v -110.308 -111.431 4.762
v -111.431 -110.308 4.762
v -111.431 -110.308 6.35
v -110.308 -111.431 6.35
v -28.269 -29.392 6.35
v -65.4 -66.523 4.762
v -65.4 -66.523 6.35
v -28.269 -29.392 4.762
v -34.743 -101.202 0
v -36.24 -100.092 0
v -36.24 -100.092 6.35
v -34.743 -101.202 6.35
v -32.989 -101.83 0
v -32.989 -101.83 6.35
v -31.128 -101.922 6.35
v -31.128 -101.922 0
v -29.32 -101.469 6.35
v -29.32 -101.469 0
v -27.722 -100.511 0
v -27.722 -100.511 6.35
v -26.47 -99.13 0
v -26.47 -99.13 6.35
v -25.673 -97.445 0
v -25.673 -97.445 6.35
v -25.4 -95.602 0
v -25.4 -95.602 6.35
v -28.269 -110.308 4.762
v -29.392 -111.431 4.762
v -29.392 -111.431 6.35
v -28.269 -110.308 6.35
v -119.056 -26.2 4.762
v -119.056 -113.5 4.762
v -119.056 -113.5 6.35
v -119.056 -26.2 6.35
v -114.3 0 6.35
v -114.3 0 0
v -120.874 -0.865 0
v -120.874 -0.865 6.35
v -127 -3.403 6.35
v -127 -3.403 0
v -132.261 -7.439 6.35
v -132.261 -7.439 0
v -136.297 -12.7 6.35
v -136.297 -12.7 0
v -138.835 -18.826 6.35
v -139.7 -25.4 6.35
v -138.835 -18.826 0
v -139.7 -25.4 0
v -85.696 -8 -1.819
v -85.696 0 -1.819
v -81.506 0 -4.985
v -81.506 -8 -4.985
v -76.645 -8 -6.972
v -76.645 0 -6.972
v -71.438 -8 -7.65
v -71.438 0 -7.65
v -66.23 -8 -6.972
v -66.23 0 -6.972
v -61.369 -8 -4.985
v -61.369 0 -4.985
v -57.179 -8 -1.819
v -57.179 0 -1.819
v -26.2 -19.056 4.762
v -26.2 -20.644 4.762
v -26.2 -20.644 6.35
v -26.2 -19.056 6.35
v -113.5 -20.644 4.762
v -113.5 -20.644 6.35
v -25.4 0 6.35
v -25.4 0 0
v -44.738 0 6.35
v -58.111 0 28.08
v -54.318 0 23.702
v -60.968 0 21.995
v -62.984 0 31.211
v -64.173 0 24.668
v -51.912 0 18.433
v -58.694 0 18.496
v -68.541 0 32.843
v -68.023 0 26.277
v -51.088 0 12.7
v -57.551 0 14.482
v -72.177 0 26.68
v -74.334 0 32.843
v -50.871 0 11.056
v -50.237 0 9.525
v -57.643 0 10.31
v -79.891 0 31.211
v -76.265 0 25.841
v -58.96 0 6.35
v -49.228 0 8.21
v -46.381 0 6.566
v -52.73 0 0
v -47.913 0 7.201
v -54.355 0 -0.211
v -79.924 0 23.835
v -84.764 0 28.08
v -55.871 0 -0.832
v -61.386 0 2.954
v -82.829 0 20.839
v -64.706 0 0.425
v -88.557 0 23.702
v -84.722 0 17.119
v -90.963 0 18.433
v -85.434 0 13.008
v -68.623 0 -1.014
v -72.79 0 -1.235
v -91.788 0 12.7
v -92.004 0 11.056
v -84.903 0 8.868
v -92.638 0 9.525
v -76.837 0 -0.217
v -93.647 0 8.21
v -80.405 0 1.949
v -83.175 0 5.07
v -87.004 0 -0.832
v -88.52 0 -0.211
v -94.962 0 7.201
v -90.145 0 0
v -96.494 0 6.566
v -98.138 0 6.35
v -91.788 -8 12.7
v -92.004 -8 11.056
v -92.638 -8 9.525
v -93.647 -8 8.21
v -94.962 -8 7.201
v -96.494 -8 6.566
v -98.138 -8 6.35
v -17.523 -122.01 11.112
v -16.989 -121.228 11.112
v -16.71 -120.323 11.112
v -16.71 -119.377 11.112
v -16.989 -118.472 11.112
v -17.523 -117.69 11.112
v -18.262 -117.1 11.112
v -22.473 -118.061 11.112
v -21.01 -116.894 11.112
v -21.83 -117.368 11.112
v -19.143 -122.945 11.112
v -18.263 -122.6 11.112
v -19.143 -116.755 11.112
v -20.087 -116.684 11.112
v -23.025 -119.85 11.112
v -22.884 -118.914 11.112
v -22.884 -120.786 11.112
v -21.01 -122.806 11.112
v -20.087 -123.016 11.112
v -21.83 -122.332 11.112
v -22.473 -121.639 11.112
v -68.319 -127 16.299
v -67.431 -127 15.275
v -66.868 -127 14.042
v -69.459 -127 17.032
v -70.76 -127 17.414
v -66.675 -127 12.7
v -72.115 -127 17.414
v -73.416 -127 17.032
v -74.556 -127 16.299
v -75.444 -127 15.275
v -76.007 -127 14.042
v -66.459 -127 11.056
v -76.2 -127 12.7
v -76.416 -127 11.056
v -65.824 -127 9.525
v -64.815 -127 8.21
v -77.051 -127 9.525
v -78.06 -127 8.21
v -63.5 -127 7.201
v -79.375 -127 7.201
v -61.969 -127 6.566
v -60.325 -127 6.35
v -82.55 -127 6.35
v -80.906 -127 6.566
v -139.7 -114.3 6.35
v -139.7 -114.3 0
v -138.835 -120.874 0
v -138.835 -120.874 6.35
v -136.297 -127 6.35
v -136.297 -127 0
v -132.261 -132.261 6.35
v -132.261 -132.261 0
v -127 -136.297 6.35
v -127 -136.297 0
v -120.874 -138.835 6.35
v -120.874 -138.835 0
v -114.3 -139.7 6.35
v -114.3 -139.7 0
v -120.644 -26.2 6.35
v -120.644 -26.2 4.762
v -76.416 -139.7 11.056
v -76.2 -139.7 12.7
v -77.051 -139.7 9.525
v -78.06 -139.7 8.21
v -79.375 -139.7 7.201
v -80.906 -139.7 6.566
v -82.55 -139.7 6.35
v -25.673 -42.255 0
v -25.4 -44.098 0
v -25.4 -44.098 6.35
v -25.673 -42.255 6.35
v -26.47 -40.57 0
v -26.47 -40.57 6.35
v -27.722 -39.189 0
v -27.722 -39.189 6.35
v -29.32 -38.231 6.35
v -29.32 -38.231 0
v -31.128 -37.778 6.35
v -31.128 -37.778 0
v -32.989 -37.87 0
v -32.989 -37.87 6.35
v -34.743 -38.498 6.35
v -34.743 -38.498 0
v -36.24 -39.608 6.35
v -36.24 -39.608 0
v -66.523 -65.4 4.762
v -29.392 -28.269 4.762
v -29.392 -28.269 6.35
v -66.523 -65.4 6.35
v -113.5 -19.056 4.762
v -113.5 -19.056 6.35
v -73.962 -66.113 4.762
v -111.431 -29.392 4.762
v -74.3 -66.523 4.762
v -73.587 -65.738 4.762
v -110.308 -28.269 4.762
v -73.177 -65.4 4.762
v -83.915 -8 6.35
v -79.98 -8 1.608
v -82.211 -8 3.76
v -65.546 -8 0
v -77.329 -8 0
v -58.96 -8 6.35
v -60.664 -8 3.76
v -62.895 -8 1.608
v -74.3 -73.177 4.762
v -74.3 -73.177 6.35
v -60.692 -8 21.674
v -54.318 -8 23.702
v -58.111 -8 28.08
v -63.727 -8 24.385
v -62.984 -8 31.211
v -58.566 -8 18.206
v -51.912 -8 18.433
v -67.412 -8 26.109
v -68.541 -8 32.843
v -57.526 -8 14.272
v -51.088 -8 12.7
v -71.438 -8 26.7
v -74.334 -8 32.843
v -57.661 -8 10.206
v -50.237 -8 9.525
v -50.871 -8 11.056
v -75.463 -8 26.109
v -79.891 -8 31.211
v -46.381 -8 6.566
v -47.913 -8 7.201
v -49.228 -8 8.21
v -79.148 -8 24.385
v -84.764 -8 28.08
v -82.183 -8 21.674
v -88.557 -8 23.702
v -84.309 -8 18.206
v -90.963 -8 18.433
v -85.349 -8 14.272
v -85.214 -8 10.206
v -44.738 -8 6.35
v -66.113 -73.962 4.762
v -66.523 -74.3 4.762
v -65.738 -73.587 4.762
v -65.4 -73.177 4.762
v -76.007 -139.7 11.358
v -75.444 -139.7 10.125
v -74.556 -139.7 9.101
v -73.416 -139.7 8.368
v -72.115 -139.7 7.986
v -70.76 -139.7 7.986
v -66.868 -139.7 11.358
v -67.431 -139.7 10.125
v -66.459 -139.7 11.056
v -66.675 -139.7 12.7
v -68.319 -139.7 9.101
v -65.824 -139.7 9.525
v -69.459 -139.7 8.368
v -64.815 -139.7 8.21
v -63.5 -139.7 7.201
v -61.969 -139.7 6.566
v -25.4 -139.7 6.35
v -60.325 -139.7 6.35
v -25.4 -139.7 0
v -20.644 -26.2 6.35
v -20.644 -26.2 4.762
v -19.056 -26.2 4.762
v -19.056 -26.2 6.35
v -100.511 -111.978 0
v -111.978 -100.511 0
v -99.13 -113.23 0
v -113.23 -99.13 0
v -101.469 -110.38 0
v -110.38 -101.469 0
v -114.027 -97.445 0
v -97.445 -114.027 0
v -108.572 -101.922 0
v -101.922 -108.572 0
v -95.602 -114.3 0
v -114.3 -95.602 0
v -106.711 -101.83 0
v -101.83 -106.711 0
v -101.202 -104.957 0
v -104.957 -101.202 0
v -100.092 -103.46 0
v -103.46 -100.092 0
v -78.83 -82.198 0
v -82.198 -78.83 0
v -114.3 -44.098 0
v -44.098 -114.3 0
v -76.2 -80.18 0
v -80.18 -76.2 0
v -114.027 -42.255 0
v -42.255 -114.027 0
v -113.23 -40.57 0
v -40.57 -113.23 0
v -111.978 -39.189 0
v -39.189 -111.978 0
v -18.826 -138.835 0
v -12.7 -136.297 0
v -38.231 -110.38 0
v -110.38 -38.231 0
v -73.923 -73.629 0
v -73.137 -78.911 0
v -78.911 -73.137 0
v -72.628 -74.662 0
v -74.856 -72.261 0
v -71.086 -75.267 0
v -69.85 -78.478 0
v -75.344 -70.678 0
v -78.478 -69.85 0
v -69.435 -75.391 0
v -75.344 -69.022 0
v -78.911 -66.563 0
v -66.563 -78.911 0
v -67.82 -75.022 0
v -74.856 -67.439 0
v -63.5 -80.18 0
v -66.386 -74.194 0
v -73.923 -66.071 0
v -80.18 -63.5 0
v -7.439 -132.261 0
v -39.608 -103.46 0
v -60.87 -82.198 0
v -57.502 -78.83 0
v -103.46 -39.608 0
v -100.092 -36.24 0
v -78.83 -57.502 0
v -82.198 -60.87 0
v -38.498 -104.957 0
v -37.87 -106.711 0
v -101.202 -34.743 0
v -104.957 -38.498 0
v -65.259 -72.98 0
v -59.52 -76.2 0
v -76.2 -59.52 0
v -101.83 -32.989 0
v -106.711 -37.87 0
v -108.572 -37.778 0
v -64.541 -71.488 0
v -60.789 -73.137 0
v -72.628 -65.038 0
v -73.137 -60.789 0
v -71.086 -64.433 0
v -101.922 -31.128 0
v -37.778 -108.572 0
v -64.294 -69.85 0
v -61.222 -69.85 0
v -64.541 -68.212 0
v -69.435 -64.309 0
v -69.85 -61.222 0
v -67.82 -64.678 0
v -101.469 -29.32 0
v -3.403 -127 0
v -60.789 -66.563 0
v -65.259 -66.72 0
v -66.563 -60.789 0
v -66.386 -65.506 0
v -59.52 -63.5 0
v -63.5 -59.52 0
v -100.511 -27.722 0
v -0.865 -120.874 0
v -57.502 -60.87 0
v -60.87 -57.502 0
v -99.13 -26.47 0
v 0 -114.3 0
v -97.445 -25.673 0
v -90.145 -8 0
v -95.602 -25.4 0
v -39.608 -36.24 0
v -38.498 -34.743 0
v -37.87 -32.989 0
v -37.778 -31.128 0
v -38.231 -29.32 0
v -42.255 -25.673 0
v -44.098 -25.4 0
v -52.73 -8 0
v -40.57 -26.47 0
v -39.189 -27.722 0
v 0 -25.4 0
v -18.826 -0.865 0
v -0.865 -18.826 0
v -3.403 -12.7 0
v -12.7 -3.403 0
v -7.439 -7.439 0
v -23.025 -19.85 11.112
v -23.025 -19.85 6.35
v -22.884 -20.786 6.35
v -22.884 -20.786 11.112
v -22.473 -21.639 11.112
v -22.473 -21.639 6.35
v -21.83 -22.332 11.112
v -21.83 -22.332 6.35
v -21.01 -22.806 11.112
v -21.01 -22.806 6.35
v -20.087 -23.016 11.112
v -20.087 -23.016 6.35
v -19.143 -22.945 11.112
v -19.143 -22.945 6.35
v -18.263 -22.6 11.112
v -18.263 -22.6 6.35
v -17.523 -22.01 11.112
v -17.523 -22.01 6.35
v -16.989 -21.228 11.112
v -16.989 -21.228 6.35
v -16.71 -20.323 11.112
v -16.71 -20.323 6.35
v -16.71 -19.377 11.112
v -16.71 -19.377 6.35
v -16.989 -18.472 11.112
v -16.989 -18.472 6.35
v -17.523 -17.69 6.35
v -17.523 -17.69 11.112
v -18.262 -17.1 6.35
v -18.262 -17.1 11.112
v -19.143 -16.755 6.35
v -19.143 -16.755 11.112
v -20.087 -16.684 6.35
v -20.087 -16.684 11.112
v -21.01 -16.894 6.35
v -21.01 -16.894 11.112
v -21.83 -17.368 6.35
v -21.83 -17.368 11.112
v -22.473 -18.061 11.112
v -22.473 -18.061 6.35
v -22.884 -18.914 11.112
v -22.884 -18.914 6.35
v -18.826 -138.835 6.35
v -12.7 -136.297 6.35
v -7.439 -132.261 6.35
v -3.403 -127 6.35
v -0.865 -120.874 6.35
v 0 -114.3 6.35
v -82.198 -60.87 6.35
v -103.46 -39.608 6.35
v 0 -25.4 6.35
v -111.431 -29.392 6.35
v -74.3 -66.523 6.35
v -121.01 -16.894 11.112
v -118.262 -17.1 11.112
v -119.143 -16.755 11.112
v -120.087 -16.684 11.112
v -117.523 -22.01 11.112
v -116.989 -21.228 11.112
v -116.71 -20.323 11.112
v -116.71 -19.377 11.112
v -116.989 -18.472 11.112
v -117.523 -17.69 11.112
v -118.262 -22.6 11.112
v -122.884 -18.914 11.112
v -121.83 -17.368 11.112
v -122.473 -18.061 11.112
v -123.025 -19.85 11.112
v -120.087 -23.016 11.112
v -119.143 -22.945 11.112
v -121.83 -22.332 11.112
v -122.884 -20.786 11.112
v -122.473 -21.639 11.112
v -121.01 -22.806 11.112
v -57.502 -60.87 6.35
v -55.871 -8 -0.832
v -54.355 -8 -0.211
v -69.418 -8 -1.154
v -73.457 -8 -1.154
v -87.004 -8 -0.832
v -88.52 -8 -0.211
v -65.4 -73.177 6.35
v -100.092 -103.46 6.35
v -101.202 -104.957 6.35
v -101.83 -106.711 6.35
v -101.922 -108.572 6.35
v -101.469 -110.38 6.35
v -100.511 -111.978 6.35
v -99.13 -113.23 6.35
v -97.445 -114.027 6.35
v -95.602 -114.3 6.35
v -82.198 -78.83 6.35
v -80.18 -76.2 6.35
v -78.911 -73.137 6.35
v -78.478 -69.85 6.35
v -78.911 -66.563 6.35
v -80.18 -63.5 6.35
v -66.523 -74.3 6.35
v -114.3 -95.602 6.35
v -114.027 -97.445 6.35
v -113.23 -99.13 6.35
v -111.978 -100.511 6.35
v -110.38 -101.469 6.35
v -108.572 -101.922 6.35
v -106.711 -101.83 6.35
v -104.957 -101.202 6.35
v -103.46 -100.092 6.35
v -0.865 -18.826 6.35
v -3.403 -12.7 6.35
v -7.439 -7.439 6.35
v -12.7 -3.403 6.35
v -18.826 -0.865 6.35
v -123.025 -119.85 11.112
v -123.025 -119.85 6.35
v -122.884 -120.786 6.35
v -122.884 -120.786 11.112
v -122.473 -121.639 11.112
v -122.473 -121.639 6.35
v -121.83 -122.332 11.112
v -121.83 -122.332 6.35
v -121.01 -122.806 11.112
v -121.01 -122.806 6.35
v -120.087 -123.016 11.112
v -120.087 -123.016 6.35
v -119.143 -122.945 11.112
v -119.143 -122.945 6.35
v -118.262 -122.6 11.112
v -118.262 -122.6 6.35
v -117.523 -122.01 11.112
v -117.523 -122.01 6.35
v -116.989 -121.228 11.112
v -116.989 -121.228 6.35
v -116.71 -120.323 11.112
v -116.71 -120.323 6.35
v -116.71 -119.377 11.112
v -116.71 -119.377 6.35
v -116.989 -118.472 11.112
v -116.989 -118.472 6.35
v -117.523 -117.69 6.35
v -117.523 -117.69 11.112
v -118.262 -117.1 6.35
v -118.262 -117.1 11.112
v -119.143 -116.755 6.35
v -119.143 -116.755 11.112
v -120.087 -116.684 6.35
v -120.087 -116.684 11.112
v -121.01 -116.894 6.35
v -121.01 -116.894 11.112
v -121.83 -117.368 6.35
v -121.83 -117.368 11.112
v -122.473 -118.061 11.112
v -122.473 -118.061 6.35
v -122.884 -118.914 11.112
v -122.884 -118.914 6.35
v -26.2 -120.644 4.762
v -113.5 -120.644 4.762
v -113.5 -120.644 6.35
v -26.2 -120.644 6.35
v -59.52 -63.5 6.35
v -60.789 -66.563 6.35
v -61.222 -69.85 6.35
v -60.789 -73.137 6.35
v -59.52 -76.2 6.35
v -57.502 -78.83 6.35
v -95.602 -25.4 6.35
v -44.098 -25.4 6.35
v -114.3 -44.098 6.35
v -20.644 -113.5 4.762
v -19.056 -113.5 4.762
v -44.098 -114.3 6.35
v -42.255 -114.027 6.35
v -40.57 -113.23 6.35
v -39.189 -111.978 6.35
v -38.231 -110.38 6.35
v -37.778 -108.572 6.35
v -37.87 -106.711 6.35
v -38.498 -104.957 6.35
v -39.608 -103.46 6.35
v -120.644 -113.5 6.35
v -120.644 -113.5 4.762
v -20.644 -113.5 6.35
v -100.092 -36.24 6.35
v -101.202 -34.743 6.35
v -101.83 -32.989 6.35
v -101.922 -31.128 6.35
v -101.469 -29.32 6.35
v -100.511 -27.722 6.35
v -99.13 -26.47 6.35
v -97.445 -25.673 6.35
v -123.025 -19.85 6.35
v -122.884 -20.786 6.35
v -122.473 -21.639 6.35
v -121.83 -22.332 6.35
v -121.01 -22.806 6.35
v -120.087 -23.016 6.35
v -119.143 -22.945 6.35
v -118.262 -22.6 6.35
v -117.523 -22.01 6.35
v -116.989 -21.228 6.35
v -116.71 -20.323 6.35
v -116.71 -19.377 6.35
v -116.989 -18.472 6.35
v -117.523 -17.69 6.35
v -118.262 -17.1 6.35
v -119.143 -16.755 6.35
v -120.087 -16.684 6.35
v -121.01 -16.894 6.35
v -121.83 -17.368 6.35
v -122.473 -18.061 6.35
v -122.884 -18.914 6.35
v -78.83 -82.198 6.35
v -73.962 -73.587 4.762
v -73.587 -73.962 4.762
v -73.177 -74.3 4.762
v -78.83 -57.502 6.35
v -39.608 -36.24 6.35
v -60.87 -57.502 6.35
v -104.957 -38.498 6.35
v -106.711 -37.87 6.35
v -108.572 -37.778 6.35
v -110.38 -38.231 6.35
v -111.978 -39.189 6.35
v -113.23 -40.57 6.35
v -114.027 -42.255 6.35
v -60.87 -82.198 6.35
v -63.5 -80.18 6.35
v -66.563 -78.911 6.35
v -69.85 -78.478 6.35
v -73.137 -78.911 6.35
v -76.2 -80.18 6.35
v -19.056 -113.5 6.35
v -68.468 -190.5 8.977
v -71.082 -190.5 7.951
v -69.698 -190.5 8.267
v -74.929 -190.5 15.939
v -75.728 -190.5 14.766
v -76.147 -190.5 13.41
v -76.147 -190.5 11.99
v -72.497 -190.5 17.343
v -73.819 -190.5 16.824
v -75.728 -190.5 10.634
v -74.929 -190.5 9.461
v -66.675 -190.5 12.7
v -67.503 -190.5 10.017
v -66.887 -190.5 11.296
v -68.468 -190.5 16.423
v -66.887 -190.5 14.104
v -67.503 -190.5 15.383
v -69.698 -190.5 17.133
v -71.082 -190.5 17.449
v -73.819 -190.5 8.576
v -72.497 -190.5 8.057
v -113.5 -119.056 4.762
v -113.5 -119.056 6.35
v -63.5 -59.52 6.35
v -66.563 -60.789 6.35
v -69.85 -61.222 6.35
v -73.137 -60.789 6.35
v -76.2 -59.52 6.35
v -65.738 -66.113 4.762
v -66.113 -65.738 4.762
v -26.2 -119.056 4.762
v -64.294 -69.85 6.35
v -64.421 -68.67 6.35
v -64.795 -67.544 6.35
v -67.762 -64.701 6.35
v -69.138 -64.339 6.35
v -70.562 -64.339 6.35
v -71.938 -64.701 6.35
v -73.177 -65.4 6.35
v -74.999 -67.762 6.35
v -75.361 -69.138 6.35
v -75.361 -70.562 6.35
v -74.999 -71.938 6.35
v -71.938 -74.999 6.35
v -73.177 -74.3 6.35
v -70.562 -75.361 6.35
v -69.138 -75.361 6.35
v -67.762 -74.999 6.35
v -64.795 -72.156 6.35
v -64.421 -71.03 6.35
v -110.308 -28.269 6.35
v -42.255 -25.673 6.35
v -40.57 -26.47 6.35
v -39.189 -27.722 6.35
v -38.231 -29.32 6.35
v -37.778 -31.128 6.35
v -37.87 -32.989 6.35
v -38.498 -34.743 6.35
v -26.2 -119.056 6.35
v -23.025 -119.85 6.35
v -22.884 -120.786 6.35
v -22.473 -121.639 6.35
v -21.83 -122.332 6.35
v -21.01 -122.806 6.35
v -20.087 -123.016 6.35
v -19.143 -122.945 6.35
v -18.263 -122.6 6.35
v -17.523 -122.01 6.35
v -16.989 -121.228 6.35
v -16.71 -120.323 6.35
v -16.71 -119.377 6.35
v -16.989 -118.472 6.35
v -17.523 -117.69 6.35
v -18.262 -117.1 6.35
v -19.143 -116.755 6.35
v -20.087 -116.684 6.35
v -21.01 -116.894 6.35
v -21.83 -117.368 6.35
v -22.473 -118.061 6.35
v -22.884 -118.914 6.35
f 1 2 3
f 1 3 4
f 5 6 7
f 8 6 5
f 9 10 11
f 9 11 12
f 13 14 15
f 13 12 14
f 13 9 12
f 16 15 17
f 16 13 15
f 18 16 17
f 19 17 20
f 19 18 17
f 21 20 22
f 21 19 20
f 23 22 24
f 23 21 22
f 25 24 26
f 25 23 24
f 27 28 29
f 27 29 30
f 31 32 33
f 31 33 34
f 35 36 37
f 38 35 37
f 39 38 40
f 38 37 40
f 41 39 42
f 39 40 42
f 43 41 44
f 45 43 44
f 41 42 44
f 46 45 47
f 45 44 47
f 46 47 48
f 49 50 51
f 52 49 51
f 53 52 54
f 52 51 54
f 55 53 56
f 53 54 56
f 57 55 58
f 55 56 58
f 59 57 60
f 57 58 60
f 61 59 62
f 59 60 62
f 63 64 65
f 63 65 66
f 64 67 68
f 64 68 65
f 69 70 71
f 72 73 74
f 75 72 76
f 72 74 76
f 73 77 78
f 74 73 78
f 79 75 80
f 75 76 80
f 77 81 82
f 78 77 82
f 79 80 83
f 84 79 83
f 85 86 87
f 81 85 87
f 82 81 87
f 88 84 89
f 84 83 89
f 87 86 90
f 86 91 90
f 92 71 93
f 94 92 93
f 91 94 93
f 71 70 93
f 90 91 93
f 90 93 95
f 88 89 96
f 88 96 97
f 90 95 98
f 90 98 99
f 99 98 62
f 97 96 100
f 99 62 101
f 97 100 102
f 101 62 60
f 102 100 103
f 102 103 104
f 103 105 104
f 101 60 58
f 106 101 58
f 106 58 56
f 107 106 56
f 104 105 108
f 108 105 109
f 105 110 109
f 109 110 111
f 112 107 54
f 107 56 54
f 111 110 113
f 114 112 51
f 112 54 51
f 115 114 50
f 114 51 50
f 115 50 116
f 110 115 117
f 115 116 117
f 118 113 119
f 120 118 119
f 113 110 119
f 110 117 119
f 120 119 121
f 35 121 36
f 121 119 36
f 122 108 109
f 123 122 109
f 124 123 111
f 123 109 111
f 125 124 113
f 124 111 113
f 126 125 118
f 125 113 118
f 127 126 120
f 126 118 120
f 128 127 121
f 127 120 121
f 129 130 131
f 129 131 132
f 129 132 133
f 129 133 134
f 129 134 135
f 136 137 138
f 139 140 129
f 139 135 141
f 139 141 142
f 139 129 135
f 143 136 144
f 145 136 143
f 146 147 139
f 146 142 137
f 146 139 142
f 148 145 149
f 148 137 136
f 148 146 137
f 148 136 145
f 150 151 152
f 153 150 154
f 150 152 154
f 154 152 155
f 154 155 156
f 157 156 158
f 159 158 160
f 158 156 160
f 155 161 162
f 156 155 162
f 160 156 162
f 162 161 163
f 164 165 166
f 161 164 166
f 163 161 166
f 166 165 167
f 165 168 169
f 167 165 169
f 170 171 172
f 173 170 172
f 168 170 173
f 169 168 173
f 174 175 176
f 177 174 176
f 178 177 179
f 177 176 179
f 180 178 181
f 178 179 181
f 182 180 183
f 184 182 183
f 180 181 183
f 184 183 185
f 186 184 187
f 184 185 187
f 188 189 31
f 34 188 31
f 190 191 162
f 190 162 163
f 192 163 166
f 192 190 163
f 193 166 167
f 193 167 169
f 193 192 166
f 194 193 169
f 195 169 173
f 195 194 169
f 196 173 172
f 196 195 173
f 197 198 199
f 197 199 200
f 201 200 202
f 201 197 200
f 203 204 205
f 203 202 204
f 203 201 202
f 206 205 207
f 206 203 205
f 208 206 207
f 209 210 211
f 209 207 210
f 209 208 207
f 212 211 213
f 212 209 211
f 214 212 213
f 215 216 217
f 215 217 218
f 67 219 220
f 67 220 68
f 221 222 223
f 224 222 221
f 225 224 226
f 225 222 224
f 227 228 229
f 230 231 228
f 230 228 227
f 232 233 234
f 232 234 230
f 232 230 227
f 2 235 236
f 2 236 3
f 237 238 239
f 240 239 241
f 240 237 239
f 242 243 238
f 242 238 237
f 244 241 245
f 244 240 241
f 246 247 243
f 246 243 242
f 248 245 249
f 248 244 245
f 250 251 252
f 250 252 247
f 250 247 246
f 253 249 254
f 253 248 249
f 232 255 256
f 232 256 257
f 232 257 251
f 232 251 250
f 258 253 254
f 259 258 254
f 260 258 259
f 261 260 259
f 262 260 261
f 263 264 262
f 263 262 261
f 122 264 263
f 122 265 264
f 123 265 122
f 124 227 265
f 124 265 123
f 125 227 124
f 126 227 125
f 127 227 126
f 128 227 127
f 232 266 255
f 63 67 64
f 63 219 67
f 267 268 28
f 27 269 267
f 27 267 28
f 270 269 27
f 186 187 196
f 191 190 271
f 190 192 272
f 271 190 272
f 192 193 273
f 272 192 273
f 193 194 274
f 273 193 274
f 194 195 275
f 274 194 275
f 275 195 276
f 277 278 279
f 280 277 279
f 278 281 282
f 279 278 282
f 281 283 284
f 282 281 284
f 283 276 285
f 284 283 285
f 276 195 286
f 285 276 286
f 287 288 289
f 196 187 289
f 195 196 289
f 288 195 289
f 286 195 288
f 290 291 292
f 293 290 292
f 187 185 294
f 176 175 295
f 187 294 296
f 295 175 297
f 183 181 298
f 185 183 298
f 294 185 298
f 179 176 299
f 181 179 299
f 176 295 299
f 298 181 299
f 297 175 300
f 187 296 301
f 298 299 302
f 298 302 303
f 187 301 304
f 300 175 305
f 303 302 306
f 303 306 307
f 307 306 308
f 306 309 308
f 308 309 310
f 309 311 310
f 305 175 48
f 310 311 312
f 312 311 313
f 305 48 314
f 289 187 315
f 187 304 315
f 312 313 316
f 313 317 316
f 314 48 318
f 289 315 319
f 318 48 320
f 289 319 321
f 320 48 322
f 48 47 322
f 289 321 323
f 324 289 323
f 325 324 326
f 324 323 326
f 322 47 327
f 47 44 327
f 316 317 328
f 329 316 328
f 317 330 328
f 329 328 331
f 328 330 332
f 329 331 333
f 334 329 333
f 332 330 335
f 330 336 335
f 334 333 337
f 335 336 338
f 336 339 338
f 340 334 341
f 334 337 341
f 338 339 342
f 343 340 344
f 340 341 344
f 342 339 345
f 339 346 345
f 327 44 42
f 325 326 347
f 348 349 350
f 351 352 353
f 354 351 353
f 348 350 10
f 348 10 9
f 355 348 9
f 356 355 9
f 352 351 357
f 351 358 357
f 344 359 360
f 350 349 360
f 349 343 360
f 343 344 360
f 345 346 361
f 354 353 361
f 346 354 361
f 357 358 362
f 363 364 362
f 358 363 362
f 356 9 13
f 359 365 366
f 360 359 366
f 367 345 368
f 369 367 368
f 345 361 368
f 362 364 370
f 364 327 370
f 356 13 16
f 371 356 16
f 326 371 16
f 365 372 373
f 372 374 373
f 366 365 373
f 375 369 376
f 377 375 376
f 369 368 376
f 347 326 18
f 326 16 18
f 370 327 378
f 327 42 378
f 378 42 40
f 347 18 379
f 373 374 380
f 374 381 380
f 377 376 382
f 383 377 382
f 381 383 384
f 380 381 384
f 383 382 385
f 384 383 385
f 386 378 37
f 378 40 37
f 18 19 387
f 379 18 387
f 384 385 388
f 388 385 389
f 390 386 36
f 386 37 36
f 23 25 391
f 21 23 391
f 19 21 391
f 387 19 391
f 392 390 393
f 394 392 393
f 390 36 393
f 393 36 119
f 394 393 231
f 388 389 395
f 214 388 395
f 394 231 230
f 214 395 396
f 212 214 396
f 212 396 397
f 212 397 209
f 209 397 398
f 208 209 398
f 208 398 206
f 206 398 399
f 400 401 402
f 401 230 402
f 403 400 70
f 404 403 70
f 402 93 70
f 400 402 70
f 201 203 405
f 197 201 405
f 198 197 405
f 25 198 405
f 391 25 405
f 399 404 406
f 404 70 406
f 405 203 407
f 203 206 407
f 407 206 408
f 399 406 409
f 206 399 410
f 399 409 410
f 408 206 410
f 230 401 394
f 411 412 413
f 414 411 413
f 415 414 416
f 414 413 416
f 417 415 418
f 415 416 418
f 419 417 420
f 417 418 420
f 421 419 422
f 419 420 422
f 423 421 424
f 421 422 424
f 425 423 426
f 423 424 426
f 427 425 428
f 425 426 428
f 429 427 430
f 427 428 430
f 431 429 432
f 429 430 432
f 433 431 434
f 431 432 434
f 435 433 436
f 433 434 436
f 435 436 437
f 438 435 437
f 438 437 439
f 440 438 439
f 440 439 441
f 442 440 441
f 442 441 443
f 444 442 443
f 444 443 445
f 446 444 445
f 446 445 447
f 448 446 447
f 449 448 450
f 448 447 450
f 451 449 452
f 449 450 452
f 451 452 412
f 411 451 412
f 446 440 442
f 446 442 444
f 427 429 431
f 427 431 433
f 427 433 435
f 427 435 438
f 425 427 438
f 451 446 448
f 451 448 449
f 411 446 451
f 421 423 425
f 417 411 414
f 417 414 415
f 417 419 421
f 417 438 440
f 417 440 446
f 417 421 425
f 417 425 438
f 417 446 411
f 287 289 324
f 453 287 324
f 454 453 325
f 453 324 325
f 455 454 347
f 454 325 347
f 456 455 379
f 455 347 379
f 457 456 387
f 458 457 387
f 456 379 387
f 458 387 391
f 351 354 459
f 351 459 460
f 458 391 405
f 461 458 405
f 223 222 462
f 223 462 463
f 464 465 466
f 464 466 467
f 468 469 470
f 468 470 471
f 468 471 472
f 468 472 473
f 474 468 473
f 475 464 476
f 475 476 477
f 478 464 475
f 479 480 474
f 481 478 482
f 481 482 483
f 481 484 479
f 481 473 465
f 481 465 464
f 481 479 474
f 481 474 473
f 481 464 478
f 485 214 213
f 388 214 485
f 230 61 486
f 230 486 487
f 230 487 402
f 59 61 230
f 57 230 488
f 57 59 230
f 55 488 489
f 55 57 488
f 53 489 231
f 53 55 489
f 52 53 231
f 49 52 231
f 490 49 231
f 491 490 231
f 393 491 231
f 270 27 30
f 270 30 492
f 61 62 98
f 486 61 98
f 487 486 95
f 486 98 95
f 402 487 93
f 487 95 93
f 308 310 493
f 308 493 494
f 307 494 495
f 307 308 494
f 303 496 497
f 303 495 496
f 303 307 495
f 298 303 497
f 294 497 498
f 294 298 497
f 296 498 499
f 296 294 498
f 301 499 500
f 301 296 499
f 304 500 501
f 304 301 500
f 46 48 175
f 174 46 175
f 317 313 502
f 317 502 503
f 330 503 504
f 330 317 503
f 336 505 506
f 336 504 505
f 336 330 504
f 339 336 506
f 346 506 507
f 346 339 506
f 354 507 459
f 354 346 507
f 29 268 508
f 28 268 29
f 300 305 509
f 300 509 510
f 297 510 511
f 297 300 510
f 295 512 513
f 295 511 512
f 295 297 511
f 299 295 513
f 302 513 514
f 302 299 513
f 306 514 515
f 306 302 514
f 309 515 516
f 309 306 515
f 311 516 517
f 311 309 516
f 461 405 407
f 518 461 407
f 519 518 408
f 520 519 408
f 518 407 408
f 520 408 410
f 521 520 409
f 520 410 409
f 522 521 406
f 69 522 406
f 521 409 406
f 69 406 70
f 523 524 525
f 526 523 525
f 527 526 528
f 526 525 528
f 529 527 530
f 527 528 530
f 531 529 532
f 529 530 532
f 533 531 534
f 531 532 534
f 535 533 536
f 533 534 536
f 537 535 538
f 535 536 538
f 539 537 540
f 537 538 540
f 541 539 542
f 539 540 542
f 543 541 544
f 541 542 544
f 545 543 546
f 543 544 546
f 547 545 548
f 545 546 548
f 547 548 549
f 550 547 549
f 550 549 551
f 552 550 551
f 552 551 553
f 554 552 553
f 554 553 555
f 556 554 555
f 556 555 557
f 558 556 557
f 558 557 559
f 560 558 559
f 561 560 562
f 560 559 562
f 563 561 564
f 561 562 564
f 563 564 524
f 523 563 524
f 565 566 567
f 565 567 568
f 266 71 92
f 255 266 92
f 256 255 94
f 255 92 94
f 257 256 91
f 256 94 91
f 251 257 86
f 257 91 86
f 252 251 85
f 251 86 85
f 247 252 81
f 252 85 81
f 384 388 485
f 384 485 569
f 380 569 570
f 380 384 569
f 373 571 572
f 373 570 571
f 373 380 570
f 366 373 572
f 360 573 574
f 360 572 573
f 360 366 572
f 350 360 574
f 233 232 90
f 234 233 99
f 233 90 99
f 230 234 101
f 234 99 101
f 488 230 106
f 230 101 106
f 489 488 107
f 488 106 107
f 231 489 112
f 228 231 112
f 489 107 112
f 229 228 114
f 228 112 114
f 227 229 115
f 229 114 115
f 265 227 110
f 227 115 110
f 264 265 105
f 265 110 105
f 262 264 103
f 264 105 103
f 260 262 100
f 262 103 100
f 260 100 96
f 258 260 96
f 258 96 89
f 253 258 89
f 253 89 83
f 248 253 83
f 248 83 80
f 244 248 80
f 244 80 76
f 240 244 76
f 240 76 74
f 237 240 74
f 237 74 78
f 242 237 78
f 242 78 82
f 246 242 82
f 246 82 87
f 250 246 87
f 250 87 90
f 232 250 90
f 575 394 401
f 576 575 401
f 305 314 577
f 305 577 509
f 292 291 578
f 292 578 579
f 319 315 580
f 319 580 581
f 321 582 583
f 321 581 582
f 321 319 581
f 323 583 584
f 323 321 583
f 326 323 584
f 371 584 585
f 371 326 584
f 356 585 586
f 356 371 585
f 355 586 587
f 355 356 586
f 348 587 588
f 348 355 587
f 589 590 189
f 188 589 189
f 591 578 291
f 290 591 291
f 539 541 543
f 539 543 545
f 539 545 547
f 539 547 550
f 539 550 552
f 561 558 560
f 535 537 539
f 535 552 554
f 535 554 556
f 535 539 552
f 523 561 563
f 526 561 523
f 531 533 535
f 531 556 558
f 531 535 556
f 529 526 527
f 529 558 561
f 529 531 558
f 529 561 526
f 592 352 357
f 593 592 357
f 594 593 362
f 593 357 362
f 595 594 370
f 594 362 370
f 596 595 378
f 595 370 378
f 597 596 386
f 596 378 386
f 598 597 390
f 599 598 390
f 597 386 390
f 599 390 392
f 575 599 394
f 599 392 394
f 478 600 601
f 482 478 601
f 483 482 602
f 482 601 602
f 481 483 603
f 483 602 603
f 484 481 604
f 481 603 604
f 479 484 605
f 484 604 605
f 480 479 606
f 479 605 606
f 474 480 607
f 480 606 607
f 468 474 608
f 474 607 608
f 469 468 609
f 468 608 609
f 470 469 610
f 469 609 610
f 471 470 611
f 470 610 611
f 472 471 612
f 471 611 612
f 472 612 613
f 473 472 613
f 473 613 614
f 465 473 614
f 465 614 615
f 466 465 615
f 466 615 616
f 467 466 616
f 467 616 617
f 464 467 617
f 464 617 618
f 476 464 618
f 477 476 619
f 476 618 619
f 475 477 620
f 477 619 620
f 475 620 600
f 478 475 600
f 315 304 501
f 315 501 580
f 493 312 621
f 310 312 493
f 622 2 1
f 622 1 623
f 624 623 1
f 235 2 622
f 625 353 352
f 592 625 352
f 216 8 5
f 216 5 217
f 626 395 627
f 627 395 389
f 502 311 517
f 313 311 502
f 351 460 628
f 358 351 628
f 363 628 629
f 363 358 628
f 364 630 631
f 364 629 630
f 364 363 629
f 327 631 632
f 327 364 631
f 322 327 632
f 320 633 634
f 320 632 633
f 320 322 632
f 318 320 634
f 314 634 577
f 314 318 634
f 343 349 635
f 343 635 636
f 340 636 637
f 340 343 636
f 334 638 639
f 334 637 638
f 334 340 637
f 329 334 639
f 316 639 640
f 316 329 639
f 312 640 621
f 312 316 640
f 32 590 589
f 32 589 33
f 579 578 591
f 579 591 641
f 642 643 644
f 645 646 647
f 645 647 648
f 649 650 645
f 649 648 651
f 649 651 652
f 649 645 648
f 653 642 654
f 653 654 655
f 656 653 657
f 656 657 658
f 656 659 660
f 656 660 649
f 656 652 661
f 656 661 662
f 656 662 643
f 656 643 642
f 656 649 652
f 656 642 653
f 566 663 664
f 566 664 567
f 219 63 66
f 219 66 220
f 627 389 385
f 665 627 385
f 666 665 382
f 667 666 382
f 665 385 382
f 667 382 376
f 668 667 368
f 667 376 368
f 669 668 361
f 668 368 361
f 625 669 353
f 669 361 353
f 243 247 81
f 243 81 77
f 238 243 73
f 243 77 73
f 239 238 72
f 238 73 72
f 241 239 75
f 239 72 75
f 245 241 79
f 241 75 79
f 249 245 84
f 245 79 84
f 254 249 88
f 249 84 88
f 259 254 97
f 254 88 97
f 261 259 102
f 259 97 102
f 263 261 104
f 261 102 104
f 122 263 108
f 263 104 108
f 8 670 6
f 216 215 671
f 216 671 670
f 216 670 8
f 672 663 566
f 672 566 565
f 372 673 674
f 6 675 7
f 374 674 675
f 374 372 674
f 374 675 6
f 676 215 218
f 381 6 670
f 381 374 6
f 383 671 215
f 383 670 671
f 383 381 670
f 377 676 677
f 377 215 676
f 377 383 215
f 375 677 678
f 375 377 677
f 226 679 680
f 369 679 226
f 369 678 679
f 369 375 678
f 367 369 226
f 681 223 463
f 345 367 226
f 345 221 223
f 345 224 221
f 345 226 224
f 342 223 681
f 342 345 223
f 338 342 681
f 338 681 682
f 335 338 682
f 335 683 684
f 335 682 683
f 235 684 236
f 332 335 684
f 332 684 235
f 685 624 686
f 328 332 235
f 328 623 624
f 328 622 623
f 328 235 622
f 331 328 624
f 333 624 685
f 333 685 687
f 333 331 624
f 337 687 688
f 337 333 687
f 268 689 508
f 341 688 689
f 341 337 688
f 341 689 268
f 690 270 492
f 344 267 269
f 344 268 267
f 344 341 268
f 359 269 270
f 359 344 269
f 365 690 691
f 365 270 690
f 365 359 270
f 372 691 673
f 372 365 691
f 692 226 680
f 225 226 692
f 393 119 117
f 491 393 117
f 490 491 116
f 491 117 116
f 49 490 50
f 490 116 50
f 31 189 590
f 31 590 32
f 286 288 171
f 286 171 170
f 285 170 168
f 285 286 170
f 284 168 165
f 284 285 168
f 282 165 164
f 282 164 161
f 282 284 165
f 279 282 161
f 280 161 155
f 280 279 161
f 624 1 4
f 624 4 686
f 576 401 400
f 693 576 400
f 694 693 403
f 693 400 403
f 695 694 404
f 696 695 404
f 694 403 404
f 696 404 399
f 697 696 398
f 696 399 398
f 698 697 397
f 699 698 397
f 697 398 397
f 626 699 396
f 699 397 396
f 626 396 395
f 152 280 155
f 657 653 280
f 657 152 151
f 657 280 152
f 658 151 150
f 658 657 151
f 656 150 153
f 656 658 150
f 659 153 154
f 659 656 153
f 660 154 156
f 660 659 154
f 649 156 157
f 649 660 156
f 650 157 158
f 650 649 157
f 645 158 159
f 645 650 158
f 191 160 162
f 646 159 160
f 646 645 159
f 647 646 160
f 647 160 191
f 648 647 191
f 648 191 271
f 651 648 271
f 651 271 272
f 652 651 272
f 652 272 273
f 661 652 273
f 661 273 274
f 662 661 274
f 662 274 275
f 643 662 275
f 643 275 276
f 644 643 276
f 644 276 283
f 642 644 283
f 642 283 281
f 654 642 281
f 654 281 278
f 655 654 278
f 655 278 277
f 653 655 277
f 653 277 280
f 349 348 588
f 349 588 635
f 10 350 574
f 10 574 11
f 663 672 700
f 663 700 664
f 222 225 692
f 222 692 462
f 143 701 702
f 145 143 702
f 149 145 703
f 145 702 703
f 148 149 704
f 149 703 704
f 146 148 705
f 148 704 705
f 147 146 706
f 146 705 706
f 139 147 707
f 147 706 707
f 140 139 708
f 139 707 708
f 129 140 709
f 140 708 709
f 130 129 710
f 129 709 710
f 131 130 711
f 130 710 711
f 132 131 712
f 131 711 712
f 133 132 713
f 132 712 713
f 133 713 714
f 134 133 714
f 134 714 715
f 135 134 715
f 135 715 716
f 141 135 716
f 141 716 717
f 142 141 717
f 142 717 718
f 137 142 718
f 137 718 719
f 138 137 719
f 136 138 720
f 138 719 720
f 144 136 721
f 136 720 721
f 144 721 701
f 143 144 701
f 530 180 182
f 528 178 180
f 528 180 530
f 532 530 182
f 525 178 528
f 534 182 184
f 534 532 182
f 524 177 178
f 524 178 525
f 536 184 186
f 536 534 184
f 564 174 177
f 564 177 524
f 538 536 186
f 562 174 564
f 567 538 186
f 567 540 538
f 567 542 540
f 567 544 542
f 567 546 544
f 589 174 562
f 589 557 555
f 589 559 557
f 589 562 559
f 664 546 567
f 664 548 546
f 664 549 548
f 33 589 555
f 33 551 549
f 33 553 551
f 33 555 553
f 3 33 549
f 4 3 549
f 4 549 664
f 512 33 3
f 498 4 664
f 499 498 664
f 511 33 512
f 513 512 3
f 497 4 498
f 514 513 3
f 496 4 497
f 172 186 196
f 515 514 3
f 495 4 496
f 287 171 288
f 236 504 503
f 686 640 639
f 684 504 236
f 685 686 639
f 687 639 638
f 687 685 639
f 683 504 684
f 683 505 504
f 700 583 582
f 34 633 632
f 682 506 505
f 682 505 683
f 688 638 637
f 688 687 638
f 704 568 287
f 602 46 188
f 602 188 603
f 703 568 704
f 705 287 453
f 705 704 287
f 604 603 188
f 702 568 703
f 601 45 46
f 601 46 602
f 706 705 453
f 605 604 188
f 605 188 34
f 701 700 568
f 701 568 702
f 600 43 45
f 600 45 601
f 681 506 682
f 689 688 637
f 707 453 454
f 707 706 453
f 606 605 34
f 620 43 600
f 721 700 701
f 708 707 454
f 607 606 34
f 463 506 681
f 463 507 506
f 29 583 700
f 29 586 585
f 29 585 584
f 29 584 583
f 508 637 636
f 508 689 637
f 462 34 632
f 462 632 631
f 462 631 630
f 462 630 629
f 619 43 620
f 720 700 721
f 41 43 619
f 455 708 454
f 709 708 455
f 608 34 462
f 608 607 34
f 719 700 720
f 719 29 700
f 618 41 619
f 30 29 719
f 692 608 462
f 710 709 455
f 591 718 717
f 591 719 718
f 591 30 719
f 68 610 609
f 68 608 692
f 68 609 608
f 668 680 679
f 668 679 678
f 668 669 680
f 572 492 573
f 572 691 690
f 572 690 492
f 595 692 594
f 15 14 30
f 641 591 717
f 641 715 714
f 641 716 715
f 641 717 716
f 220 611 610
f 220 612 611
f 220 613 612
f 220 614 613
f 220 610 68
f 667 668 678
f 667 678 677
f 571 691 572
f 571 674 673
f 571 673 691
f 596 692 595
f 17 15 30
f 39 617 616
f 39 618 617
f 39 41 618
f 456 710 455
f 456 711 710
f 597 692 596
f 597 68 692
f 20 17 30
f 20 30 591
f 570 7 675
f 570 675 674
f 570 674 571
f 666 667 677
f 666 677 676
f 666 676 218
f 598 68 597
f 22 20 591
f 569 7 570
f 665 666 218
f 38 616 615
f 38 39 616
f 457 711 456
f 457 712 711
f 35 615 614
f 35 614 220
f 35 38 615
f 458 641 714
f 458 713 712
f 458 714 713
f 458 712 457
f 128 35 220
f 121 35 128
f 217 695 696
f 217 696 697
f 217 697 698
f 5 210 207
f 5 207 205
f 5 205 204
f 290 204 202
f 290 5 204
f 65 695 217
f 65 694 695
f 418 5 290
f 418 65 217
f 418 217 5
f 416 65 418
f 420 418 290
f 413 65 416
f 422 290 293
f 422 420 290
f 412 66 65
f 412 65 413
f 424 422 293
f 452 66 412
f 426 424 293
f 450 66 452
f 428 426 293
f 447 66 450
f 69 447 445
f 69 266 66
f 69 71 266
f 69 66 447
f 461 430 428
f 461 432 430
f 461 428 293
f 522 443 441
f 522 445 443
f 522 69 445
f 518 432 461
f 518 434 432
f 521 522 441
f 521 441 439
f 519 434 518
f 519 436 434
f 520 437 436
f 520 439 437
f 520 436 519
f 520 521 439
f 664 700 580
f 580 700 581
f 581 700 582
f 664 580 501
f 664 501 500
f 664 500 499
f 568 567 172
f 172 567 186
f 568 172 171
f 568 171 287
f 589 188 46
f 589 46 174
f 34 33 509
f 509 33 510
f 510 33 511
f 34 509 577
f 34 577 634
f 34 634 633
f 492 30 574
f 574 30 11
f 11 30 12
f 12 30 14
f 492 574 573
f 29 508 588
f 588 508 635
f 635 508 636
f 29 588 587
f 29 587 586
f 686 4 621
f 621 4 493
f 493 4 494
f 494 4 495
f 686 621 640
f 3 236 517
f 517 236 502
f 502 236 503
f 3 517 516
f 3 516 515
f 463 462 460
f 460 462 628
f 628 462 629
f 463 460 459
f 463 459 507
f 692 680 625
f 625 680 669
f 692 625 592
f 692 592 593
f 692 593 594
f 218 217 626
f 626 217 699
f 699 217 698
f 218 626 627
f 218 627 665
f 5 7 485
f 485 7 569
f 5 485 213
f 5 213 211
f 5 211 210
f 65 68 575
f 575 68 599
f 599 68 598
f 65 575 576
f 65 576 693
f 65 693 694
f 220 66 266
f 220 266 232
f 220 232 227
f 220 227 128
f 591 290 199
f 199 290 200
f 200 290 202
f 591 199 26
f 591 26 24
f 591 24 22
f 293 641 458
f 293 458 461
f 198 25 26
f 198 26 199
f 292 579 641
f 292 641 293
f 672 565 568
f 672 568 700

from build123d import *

# Parameters (mm, degrees)
BOSS_EXTRUDE2_DEPTH     = 6.35
CUT_EXTRUDE1_DEPTH      = 198.667656687
CUT_EXTRUDE1_DEPTH_BACK = 198.667656687
SKETCH2_R               = 5.55625
CUT_EXTRUDE2_DEPTH      = 198.667656687
CUT_EXTRUDE2_DEPTH_BACK = 1.5875
SKETCH3_W               = 1.5875
SKETCH3_H               = 87.3
SKETCH3_3_R             = 3.175
BOSS_EXTRUDE3_DEPTH     = 4.7625
SKETCH6_R               = 14
BOSS_EXTRUDE7_DEPTH     = 8
BOSS_EXTRUDE8_START     = -139.7
BOSS_EXTRUDE8_DEPTH     = 12.7
BOSS_EXTRUDE9_START     = 50.8
SKETCH12_R              = 4.7625
BOSS_EXTRUDE9_DEPTH     = 50.8
SKETCH13_R              = 14
CUT_EXTRUDE3_DEPTH      = 8


with BuildPart() as part:
    # Sketch1 → Boss-Extrude2 (new body)
    with BuildSketch(Plane.XY):
        with BuildLine():
            Line((-25.4, 0), (-114.3, 0))
            ThreePointArc((-114.3, 0), (-132.260512242, -7.439487758), (-139.7, -25.4))
            Line((-139.7, -25.4), (-139.7, -114.3))
            ThreePointArc((-139.7, -114.3), (-132.260512242, -132.260512242), (-114.3, -139.7))
            Line((-114.3, -139.7), (-25.4, -139.7))
            ThreePointArc((-25.4, -139.7), (-7.439487758, -132.260512242), (0, -114.3))
            Line((0, -114.3), (0, -25.4))
            ThreePointArc((0, -25.4), (-7.439487758, -7.439487758), (-25.4, 0))
        make_face()
    extrude(amount=BOSS_EXTRUDE2_DEPTH)

    # Sketch2 → Cut-Extrude1 (cut, two sides: drawn at the far end of the back side and taken through both)
    with BuildSketch(Plane.XY.offset(6.35).offset(-CUT_EXTRUDE1_DEPTH_BACK)):
        with Locations((-69.85, -69.85)):
            Circle(SKETCH2_R)
        with BuildLine():
            Line((-95.602147834, -25.4), (-44.097852166, -25.4))
            ThreePointArc((-44.097852166, -25.4), (-38.231217135, -29.319960204), (-39.607724106, -36.240128061))
            Line((-39.607724106, -36.240128061), (-60.869743879, -57.502147834))
            ThreePointArc((-60.869743879, -57.502147834), (-69.85, -61.221891712), (-78.830256121, -57.502147834))
            Line((-78.830256121, -57.502147834), (-100.092275894, -36.240128061))
            ThreePointArc((-100.092275894, -36.240128061), (-101.468782865, -29.319960204), (-95.602147834, -25.4))
        make_face()
        with BuildLine():
            Line((-57.502147834, -78.830256121), (-36.240128061, -100.092275894))
            ThreePointArc((-36.240128061, -100.092275894), (-29.319960204, -101.468782865), (-25.4, -95.602147834))
            Line((-25.4, -95.602147834), (-25.4, -44.097852166))
            ThreePointArc((-25.4, -44.097852166), (-29.319960204, -38.231217135), (-36.240128061, -39.607724106))
            Line((-36.240128061, -39.607724106), (-57.502147834, -60.869743879))
            ThreePointArc((-57.502147834, -60.869743879), (-61.221891712, -69.85), (-57.502147834, -78.830256121))
        make_face()
        with BuildLine():
            Line((-78.830256121, -82.197852166), (-100.092275894, -103.459871939))
            ThreePointArc((-100.092275894, -103.459871939), (-101.468782865, -110.380039796), (-95.602147834, -114.3))
            Line((-95.602147834, -114.3), (-44.097852166, -114.3))
            ThreePointArc((-44.097852166, -114.3), (-38.231217135, -110.380039796), (-39.607724106, -103.459871939))
            Line((-39.607724106, -103.459871939), (-60.869743879, -82.197852166))
            ThreePointArc((-60.869743879, -82.197852166), (-69.85, -78.478108288), (-78.830256121, -82.197852166))
        make_face()
        with BuildLine():
            Line((-82.197852166, -60.869743879), (-103.459871939, -39.607724106))
            ThreePointArc((-103.459871939, -39.607724106), (-110.380039796, -38.231217135), (-114.3, -44.097852166))
            Line((-114.3, -44.097852166), (-114.3, -95.602147834))
            ThreePointArc((-114.3, -95.602147834), (-110.380039796, -101.468782865), (-103.459871939, -100.092275894))
            Line((-103.459871939, -100.092275894), (-82.197852166, -78.830256121))
            ThreePointArc((-82.197852166, -78.830256121), (-78.478108288, -69.85), (-82.197852166, -60.869743879))
        make_face()
    extrude(amount=CUT_EXTRUDE1_DEPTH + CUT_EXTRUDE1_DEPTH_BACK, mode=Mode.SUBTRACT)

    # Sketch3 → Cut-Extrude2 (cut, two sides: drawn at the far end of the back side and taken through both)
    with BuildSketch(Plane.XY.offset(6.35).offset(-CUT_EXTRUDE2_DEPTH_BACK)):
        Polygon((-26.2, -119.05625), (-69.85, -119.05625), (-113.5, -119.05625), (-113.5, -120.64375), (-26.2, -120.64375), align=None)
        Polygon((-29.391522129, -28.268990114), (-69.85, -68.727467985), (-68.727467985, -69.85), (-28.268990114, -29.391522129), align=None)
        Polygon((-70.972532015, -69.85), (-69.85, -68.727467985), (-110.308477871, -28.268990114), (-111.431009886, -29.391522129), align=None)
        Polygon((-113.5, -20.64375), (-69.85, -20.64375), (-26.2, -20.64375), (-26.2, -19.05625), (-113.5, -19.05625), align=None)
        Polygon((-110.308477871, -111.431009886), (-69.85, -70.972532015), (-70.972532015, -69.85), (-111.431009886, -110.308477871), align=None)
        Polygon((-68.727467985, -69.85), (-69.85, -70.972532015), (-29.391522129, -111.431009886), (-28.268990114, -110.308477871), align=None)
        with Locations((-119.85, -69.85)):
            Rectangle(SKETCH3_W, SKETCH3_H)
        with Locations((-19.85, -69.85)):
            Rectangle(SKETCH3_W, SKETCH3_H)
    extrude(amount=CUT_EXTRUDE2_DEPTH + CUT_EXTRUDE2_DEPTH_BACK, mode=Mode.SUBTRACT)

    # Sketch3<3> → Boss-Extrude3 (add)
    with BuildSketch(Plane.XY.offset(6.35)):
        with Locations(Location((-119.85, -19.85, 0), (0, 0, 180))):
            Circle(SKETCH3_3_R)
        with Locations(Location((-19.85, -19.85, 0), (0, 0, 180))):
            Circle(SKETCH3_3_R)
        with Locations(Location((-19.85, -119.85, 0), (0, 0, 180))):
            Circle(SKETCH3_3_R)
        with Locations(Location((-119.85, -119.85, 0), (0, 0, 180))):
            Circle(SKETCH3_3_R)
    extrude(amount=BOSS_EXTRUDE3_DEPTH)

    # Sketch6 → Boss-Extrude7 (add)
    with BuildSketch(Plane(origin=(0, 0, 0), x_dir=(1, 0, 0), z_dir=(0, 1, 0))):
        with BuildLine():
            Line((-98.1375, -6.35), (-90.771408037, -6.35))
            ThreePointArc((-90.771408037, -6.35), (-89.338621713, -3.021552737), (-87.338207531, 0))
            Line((-87.338207531, 0), (-90.145452854, 0))
            ThreePointArc((-90.145452854, 0), (-87.742009924, 0.472418688), (-85.696183168, 1.819382022))
            ThreePointArc((-85.696183168, 1.819382022), (-71.4375, 7.65), (-57.178816832, 1.819382022))
            ThreePointArc((-57.178816832, 1.819382022), (-55.132990076, 0.472418688), (-52.729547146, 0))
            Line((-52.729547146, 0), (-55.536792469, 0))
            ThreePointArc((-55.536792469, 0), (-53.536378287, -3.021552737), (-52.103591963, -6.35))
            Line((-52.103591963, -6.35), (-44.7375, -6.35))
            ThreePointArc((-44.7375, -6.35), (-49.227628061, -8.209871939), (-51.0875, -12.7))
            ThreePointArc((-51.0875, -12.7), (-71.4375, -33.05), (-91.7875, -12.7))
            ThreePointArc((-91.7875, -12.7), (-93.647371939, -8.209871939), (-98.1375, -6.35))
        make_face()
        with Locations((-71.4375, -12.7)):
            Circle(SKETCH6_R, mode=Mode.SUBTRACT)
    extrude(amount=-BOSS_EXTRUDE7_DEPTH)

    # Sketch5 → Boss-Extrude8 (add)
    with BuildSketch(Plane(origin=(0, 0, 0), x_dir=(1, 0, 0), z_dir=(0, 1, 0)).offset(BOSS_EXTRUDE8_START)):
        with BuildLine():
            Line((-82.55, -6.35), (-60.325, -6.35))
            ThreePointArc((-60.325, -6.35), (-64.815128061, -8.209871939), (-66.675, -12.7))
            ThreePointArc((-66.675, -12.7), (-71.4375, -17.4625), (-76.2, -12.7))
            ThreePointArc((-76.2, -12.7), (-78.059871939, -8.209871939), (-82.55, -6.35))
        make_face()
    extrude(amount=BOSS_EXTRUDE8_DEPTH)

    # Sketch12 → Boss-Extrude9 (add)
    with BuildSketch(Plane.XZ.offset(139.7).offset(BOSS_EXTRUDE9_START)):
        with Locations((-71.4375, 12.7)):
            Circle(SKETCH12_R)
    extrude(amount=-BOSS_EXTRUDE9_DEPTH)

    # Sketch13 → Cut-Extrude3 (cut)
    with BuildSketch(Plane(origin=(0, 0, 0), x_dir=(1, 0, 0), z_dir=(0, 1, 0))):
        with Locations(Location((-71.4375, -12.7, 0), (0, 0, 270))):
            Circle(SKETCH13_R)
    extrude(amount=-CUT_EXTRUDE3_DEPTH, mode=Mode.SUBTRACT)


solid = part.part
